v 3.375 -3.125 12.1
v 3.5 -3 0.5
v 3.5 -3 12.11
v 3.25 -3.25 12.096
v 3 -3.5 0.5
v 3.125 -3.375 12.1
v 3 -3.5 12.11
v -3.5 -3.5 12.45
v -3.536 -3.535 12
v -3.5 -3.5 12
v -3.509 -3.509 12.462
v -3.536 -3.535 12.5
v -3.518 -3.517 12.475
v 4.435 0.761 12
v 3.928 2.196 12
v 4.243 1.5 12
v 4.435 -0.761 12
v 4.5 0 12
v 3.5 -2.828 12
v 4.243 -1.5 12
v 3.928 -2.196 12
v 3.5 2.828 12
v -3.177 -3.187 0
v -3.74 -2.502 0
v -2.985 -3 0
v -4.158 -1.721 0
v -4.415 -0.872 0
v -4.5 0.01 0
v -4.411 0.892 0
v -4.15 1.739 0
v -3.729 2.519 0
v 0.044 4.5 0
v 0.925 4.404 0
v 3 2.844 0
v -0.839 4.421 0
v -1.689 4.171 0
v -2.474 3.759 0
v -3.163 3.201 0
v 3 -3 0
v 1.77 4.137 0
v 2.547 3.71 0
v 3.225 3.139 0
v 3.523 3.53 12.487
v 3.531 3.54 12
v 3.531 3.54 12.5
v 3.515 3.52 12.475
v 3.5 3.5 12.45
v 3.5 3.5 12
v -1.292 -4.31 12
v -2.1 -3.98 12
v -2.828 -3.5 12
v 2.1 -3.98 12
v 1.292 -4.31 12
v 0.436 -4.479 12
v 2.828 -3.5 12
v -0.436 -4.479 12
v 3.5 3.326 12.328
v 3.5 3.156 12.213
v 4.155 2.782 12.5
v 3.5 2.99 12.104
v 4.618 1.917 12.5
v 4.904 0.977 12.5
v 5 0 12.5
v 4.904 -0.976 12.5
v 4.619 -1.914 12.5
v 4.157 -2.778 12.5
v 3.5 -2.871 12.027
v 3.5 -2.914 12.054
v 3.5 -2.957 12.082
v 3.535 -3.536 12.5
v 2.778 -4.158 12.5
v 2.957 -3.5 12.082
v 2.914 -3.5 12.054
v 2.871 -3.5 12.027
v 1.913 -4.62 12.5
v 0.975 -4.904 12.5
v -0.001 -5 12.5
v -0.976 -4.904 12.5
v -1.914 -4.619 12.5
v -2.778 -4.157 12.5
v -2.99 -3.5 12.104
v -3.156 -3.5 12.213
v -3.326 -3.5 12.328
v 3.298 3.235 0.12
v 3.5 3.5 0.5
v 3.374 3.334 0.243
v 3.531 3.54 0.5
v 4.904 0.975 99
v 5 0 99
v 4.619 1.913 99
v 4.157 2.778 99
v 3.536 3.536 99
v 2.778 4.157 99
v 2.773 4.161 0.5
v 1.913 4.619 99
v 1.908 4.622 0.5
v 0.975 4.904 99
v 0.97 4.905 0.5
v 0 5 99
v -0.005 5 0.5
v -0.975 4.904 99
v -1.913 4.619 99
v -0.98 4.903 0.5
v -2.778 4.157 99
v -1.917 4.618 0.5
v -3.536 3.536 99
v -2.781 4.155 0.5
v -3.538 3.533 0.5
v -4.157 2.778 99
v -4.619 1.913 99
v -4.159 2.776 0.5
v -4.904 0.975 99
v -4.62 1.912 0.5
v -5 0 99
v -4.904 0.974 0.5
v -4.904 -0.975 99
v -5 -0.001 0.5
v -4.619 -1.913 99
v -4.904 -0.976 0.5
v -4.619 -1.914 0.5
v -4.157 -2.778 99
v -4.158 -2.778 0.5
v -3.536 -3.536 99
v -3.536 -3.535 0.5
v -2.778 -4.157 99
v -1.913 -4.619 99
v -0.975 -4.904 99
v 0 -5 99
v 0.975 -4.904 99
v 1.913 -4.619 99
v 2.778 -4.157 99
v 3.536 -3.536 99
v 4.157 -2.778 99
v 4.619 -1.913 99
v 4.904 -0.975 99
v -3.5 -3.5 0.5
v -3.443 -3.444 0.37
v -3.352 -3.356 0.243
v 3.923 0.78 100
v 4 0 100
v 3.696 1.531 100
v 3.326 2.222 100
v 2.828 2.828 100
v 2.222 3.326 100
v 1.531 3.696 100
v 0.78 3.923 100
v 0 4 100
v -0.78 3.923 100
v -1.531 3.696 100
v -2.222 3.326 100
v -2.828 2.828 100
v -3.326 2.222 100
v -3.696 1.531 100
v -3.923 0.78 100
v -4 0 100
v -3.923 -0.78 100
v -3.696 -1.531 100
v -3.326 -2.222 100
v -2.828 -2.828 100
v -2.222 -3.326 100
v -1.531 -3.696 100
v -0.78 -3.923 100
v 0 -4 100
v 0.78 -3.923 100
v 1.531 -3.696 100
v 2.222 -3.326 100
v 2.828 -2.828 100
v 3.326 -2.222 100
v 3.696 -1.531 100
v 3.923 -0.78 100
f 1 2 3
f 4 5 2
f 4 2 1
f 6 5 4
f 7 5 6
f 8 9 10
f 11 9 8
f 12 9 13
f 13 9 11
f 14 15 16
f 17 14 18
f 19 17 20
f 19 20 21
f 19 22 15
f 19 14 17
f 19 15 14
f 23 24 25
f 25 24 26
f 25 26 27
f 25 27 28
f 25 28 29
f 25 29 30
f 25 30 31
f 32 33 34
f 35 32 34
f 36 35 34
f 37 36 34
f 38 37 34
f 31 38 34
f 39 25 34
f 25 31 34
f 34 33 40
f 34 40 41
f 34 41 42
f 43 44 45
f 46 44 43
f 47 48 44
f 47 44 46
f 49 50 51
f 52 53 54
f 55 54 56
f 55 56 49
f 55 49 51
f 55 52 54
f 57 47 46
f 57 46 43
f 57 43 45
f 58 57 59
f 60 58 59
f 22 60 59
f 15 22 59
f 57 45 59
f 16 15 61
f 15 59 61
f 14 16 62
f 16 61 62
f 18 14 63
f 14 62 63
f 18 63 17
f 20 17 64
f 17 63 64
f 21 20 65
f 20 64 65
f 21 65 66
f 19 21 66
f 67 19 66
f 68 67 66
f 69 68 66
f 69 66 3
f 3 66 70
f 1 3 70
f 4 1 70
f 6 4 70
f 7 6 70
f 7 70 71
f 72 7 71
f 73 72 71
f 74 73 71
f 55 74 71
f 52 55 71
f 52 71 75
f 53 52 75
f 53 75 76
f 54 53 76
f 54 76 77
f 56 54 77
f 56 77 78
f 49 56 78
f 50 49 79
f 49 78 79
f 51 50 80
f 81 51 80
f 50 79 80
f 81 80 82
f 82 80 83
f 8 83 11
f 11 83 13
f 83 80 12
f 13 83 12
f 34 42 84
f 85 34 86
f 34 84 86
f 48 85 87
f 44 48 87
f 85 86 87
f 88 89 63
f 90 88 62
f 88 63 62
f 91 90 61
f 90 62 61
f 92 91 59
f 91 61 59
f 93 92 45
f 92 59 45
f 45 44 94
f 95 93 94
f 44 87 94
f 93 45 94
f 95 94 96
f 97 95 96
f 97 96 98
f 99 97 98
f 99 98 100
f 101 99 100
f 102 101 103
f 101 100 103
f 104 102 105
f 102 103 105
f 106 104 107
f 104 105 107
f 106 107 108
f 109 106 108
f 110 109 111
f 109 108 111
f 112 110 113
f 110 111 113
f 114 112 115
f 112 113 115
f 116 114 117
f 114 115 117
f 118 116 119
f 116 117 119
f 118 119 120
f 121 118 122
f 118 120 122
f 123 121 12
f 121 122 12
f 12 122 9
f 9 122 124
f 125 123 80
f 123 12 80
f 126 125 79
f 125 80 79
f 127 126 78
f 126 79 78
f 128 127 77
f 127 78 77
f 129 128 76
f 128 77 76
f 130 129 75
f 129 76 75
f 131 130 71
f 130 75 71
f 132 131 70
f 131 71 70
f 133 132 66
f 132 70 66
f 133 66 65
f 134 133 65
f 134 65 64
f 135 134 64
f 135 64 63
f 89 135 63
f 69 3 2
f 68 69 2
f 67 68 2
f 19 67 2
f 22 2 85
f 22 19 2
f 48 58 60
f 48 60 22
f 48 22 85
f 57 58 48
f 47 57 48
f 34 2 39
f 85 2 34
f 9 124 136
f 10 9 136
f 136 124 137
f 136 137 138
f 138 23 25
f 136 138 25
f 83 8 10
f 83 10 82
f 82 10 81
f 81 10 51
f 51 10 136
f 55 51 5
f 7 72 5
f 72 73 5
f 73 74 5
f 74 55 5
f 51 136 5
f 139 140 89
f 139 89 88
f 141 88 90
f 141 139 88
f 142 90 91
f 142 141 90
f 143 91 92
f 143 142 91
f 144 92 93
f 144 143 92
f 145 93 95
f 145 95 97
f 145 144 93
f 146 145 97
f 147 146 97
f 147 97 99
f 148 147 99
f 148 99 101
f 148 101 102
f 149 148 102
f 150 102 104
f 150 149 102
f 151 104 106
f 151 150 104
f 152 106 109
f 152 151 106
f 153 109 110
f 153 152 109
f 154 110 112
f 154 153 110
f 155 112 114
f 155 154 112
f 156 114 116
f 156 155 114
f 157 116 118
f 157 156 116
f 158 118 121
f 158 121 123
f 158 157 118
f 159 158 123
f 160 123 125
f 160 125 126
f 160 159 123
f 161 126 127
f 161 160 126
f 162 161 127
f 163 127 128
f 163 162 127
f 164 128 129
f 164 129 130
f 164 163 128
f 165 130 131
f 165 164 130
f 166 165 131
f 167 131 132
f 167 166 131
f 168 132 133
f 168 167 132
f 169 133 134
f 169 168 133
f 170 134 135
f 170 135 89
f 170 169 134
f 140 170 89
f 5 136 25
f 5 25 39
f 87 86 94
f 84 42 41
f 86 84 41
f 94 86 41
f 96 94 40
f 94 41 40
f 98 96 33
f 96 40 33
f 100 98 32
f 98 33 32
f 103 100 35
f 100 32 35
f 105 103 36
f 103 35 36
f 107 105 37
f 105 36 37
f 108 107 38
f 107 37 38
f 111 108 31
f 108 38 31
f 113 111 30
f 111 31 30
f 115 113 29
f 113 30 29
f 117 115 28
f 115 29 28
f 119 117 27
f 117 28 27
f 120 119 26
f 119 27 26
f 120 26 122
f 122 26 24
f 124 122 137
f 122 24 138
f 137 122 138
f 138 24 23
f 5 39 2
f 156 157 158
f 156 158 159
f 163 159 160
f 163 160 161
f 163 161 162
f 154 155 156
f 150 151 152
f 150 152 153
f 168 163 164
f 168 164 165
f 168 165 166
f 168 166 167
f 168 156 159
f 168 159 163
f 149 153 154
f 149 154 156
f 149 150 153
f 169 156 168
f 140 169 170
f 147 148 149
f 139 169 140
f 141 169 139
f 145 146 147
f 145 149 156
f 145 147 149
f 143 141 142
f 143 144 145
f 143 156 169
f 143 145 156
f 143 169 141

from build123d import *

# Parameters (mm, degrees)
F0_R         = 5
F1_DEPTH     = 100
F3_DEPTH     = 12
F4_SIZE      = 1
F5_SIZE      = 0.5
F6_T2_ANGLE  = 209.430321651
F6_T6_ANGLE  = 59.8137801049
F6_T12_ANGLE = 149.7566863334
F6_T18_ANGLE = 149.7566863334
F6_T25_ANGLE = 149.7566863334
F6_T31_ANGLE = 149.7566863334
F6_T38_ANGLE = 149.7566863334
F6_T45_ANGLE = 149.7566863334


# Not quite as in the source:
# - a fillet or chamfer that OpenCascade refuses, or shapes differently, is made with other operations: its cross-section is extruded or revolved along the edge and cut away or added


with BuildPart() as f1:
    # F0 (on Top) → F1 (new body)
    with BuildSketch(Plane.XY):
        Circle(F0_R)
    extrude(amount=F1_DEPTH)

    # F2 (on face) → F3 (cut)
    with BuildSketch(Plane(origin=(0, 0, 0), x_dir=(1, 0, 0), z_dir=(0, 0, -1))):
        with BuildLine():
            Line((-3.5, 3.5), (3.5, 3.5))
            Line((3.5, 3.5), (3.5, -3.5))
            Line((3.5, -3.5), (3.5307399131, -3.5403214072))
            ThreePointArc((3.5307399131, -3.5403214072), (4.6181002352, -1.9165464297), (5, 0))
            ThreePointArc((5, 0), (1.9130662834, 4.6195429855), (-3.5360709581, 3.5349967722))
            Line((-3.5360709581, 3.5349967722), (-3.5, 3.5))
        make_face()
    extrude(amount=-F3_DEPTH, mode=Mode.SUBTRACT)

    # F4
    f4_edges = [f1.edges().sort_by_distance(p)[0] for p in [
        (-5, 0, 100),
    ]]
    chamfer(f4_edges, length=F4_SIZE)

    # F5
    f5_edges = [f1.edges().sort_by_distance(p)[0] for p in [
        (0, -3.5, 0),
        (3.5, 0, 0),
        (3.5, -3.5, 6),
    ]]
    chamfer(f5_edges, length=F5_SIZE)

    # F6: chamfer of 0.5 on 3 edges, made by hand

    # F6_s1 → F6_t2 (revolve, cut)
    with BuildSketch(Plane(origin=(0, 0, 0), x_dir=(0, 0, 1), z_dir=(0.5048185175, -0.8632255003, 0))):
        Polygon((0.5, -5), (0, -4.5), (0, -5), align=None)
    revolve(axis=Axis((0, 0, 0), (0, 0, 1)), revolution_arc=F6_T2_ANGLE, mode=Mode.SUBTRACT)


with BuildPart() as f6_tool4:
    # F6_s5 → F6_t6 (revolve)
    with BuildSketch(Plane(origin=(0, 0, 0), x_dir=(0, 0, 1), z_dir=(-0.8643957574, 0.5028120669, 0))):
        Polygon((12, 4.5), (12.5, 5), (12, 5), align=None)
    revolve(axis=Axis((0, 0, 12), (0, 0, -1)), revolution_arc=F6_T6_ANGLE)

    split(bisect_by=Plane.YZ.offset(3.5), keep=Keep.TOP)

    split(bisect_by=Plane(origin=(0.5259878903, -0.4009984555, 0), x_dir=(0, 0, 1), z_dir=(0.7952525516, -0.6062783018, 0)), keep=Keep.TOP)


with BuildPart() as f1_1:
    add(f1.part)

    # F6_t3: cut F6_tool4
    add(f6_tool4.part, mode=Mode.SUBTRACT)


with BuildPart() as f6_tool10:
    # F6_s11 → F6_t12 (revolve)
    with BuildSketch(Plane.XZ):
        Polygon((4.5, 12), (5, 12.5), (5, 12), align=None)
    revolve(axis=Axis((0, 0, 12), (0, 0, -1)), revolution_arc=F6_T12_ANGLE)

    split(bisect_by=Plane(origin=(3.25, -3.25, 0), x_dir=(0, 0, 1), z_dir=(-0.7071067812, 0.7071067812, 0)), keep=Keep.TOP)

    split(bisect_by=Plane.YZ.offset(3.5), keep=Keep.TOP)


with BuildPart() as f1_2:
    add(f1_1.part)

    # F6_t9: cut F6_tool10
    add(f6_tool10.part, mode=Mode.SUBTRACT)


with BuildPart() as f6_tool16:
    # F6_s17 → F6_t18 (revolve)
    with BuildSketch(Plane.XZ):
        Polygon((4.5, 12), (5, 12.5), (5, 12), align=None)
    revolve(axis=Axis((0, 0, 12), (0, 0, -1)), revolution_arc=F6_T18_ANGLE)

    split(bisect_by=Plane.XZ.offset(3.5), keep=Keep.BOTTOM)

    split(bisect_by=Plane(origin=(3.25, -3.25, 0), x_dir=(0, 0, 1), z_dir=(0.7071067812, -0.7071067812, 0)), keep=Keep.TOP)

    split(bisect_by=Plane.YZ.offset(3.5), keep=Keep.TOP)


with BuildPart() as f1_3:
    add(f1_2.part)

    # F6_t15: cut F6_tool16
    add(f6_tool16.part, mode=Mode.SUBTRACT)


with BuildPart() as f6_tool23:
    # F6_s24 → F6_t25 (revolve)
    with BuildSketch(Plane.XZ):
        Polygon((4.5, 12), (5, 12.5), (5, 12), align=None)
    revolve(axis=Axis((0, 0, 12), (0, 0, -1)), revolution_arc=F6_T25_ANGLE)

    split(bisect_by=Plane.XZ.offset(3.5), keep=Keep.TOP)

    split(bisect_by=Plane.YZ.offset(3.5), keep=Keep.TOP)


with BuildPart() as f1_4:
    add(f1_3.part)

    # F6_t22: cut F6_tool23
    add(f6_tool23.part, mode=Mode.SUBTRACT)


with BuildPart() as f6_tool29:
    # F6_s30 → F6_t31 (revolve)
    with BuildSketch(Plane.XZ):
        Polygon((4.5, 12), (5, 12.5), (5, 12), align=None)
    revolve(axis=Axis((0, 0, 12), (0, 0, -1)), revolution_arc=F6_T31_ANGLE)

    split(bisect_by=Plane.XZ.offset(3.5), keep=Keep.BOTTOM)

    split(bisect_by=Plane(origin=(3.25, -3.25, 0), x_dir=(0, 0, 1), z_dir=(0.7071067812, -0.7071067812, 0)), keep=Keep.TOP)

    split(bisect_by=Plane.YZ.offset(3.5), keep=Keep.BOTTOM)


with BuildPart() as f1_5:
    add(f1_4.part)

    # F6_t28: cut F6_tool29
    add(f6_tool29.part, mode=Mode.SUBTRACT)


with BuildPart() as f6_tool36:
    # F6_s37 → F6_t38 (revolve)
    with BuildSketch(Plane.XZ):
        Polygon((4.5, 12), (5, 12.5), (5, 12), align=None)
    revolve(axis=Axis((0, 0, 12), (0, 0, -1)), revolution_arc=F6_T38_ANGLE)

    split(bisect_by=Plane.XZ.offset(3.5), keep=Keep.TOP)

    split(bisect_by=Plane(origin=(3.25, -3.25, 0), x_dir=(0, 0, 1), z_dir=(-0.7071067812, 0.7071067812, 0)), keep=Keep.TOP)

    split(bisect_by=Plane(origin=(0.0520908408, -0.0536897095, 0), x_dir=(0, 0, 1), z_dir=(0.6963393518, -0.7177126913, 0)), keep=Keep.TOP)


with BuildPart() as f1_6:
    add(f1_5.part)

    # F6_t35: cut F6_tool36
    add(f6_tool36.part, mode=Mode.SUBTRACT)


with BuildPart() as f6_tool43:
    # F6_s44 → F6_t45 (revolve)
    with BuildSketch(Plane.XZ):
        Polygon((4.5, 12), (5, 12.5), (5, 12), align=None)
    revolve(axis=Axis((0, 0, 12), (0, 0, -1)), revolution_arc=F6_T45_ANGLE)

    split(bisect_by=Plane.XZ.offset(3.5), keep=Keep.TOP)

    split(bisect_by=Plane(origin=(3.25, -3.25, 0), x_dir=(0, 0, 1), z_dir=(0.7071067812, -0.7071067812, 0)), keep=Keep.TOP)

    split(bisect_by=Plane.YZ.offset(3.5), keep=Keep.BOTTOM)


with BuildPart() as f1_7:
    add(f1_6.part)

    # F6_t42: cut F6_tool43
    add(f6_tool43.part, mode=Mode.SUBTRACT)


solid = f1_7.part
